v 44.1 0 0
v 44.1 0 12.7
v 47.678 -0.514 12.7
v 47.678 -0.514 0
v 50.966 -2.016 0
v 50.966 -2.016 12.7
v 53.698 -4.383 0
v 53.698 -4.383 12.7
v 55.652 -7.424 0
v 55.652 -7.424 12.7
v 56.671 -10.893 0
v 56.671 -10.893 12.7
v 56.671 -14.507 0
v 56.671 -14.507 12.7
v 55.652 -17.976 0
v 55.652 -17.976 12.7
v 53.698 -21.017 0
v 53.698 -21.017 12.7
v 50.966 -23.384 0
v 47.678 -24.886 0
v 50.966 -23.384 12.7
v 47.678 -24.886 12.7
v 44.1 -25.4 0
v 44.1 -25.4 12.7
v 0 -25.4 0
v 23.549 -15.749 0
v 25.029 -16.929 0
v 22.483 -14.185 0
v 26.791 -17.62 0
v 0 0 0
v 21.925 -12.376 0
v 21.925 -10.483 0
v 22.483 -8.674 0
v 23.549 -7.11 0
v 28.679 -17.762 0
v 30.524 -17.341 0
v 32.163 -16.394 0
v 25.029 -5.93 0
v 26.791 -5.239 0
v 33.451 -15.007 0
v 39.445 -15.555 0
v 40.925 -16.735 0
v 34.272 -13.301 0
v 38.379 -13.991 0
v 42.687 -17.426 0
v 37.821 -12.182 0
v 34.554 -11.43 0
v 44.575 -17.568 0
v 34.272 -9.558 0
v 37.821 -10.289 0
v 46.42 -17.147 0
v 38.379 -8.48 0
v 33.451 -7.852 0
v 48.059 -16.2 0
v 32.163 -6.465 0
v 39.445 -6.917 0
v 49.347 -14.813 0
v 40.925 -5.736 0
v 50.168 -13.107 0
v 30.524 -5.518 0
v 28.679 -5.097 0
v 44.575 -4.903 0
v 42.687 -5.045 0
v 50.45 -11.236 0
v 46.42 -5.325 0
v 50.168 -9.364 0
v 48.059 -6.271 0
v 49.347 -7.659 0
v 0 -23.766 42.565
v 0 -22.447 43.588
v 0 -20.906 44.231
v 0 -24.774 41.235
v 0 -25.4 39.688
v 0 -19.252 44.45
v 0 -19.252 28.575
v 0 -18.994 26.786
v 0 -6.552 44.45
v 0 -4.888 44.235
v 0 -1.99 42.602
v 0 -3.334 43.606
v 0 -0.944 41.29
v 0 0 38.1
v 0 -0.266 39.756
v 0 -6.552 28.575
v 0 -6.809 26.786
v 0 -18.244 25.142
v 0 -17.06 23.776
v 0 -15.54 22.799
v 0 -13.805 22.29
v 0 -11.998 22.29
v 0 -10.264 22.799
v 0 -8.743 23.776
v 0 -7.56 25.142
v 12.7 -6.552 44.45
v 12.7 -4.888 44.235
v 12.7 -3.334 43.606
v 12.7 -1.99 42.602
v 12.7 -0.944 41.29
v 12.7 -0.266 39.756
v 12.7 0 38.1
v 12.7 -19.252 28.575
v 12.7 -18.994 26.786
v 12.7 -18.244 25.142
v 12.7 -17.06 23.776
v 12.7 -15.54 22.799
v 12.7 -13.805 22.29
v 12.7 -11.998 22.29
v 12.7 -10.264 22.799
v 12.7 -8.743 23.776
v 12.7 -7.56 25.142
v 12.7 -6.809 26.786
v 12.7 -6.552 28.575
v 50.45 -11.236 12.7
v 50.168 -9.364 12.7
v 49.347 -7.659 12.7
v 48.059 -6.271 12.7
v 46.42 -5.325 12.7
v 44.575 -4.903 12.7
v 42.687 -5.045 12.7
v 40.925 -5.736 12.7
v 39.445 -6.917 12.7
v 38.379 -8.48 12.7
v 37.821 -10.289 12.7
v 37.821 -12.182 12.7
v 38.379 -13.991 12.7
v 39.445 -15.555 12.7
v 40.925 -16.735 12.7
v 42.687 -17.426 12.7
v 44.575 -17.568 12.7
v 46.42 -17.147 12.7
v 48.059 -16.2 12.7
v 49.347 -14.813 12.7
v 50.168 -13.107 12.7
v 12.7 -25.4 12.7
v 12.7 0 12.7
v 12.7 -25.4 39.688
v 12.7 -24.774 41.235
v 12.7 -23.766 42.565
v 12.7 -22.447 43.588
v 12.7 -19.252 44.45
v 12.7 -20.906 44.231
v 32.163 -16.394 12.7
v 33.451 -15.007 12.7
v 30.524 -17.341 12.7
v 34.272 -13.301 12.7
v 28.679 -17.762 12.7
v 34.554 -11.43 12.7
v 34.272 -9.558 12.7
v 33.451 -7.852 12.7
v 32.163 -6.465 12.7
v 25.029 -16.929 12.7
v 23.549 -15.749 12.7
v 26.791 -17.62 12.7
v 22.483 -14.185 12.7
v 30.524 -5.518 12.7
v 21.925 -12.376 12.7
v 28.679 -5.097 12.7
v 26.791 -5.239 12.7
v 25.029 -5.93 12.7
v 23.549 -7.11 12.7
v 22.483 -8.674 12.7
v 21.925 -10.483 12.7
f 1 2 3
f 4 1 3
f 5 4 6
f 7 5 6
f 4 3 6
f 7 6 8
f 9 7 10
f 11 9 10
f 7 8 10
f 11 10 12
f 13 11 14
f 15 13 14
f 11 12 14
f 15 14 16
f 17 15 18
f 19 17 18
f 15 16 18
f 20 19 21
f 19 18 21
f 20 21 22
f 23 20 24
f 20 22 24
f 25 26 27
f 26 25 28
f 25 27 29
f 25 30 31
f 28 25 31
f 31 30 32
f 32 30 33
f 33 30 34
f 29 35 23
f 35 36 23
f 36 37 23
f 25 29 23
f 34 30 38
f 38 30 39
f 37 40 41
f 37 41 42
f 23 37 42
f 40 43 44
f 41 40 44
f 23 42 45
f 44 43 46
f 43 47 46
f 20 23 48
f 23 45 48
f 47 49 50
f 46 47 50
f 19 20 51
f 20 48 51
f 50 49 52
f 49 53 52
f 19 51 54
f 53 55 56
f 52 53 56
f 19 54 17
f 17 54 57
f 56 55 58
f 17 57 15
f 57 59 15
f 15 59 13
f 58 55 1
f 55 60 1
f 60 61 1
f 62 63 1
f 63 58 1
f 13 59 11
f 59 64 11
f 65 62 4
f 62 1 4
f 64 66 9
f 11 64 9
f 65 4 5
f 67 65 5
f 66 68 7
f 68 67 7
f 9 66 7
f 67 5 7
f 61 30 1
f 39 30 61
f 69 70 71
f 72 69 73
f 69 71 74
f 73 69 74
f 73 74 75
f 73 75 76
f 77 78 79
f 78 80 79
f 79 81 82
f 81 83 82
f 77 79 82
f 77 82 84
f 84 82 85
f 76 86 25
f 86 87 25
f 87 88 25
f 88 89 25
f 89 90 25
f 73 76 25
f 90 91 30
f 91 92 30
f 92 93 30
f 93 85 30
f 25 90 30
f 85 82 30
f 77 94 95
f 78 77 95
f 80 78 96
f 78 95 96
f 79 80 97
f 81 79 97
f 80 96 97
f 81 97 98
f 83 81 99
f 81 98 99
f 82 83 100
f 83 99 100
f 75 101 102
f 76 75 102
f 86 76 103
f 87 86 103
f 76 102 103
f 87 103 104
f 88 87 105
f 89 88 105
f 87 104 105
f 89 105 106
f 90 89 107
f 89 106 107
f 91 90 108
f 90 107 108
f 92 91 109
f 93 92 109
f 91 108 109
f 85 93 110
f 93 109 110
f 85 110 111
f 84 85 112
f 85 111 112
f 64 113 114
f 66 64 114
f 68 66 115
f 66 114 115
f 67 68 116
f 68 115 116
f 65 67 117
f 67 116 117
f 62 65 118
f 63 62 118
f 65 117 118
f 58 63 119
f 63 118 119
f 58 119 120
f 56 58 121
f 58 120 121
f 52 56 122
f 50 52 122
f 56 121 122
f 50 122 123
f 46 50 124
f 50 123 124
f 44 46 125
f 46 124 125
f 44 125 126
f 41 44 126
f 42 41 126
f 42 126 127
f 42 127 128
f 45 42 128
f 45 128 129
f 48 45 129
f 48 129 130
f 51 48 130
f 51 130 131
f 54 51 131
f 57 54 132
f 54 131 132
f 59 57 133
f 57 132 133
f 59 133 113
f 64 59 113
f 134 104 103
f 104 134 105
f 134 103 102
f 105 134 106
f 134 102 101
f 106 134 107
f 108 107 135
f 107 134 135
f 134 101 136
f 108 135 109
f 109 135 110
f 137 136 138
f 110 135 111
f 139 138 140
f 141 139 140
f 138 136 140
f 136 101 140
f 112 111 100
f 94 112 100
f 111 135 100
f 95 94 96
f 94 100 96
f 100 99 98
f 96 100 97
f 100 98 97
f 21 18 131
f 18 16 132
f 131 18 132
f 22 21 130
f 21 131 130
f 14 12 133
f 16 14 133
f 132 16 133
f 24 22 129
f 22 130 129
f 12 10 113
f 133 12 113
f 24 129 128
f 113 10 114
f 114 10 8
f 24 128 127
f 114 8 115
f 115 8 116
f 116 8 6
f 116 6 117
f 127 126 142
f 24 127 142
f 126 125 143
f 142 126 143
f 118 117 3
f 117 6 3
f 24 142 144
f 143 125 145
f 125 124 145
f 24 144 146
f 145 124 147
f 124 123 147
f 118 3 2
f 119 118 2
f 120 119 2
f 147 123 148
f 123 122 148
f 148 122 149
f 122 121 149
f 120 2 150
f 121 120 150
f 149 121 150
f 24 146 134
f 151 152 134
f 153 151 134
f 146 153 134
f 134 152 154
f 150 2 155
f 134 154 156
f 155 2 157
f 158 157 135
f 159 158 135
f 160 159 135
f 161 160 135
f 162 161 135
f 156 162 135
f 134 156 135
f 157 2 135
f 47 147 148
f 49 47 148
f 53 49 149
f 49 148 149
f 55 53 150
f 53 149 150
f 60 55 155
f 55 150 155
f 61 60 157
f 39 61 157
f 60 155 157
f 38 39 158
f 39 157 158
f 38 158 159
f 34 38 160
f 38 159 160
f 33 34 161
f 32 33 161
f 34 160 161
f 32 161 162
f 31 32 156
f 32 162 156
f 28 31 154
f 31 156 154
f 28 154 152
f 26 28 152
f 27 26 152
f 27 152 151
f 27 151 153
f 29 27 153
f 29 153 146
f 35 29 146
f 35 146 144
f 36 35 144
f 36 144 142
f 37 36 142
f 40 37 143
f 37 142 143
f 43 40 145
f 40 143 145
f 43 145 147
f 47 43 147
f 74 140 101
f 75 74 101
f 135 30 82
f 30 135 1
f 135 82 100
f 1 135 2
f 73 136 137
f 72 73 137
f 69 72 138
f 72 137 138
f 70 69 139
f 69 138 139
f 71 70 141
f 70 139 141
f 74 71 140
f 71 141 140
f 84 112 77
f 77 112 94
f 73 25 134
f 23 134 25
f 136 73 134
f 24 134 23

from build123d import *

# Parameters (mm, degrees)
F1_DEPTH = 25.4
F3_DEPTH = 12.7
F4_R     = 6.35
F5_DEPTH = 12.7


with BuildPart() as f1:
    # F0 (on Front) → F1 (new body)
    with BuildSketch(Plane.XZ):
        Polygon((0, 44.45), (0, 0), (57.15, 0), (57.15, 12.7), (12.7, 12.7), (12.7, 44.45), align=None)
    extrude(amount=F1_DEPTH)

    # F2 (on face) → F3 (cut)
    with BuildSketch(Plane.YZ.offset(12.7)):
        with BuildLine():
            ThreePointArc((-19.2516389379, 28.575), (-12.9016389379, 22.225), (-6.5516389379, 28.575))
            ThreePointArc((-6.5516389379, 28.575), (-12.9016389379, 34.925), (-19.2516389379, 28.575))
        make_face()
        with BuildLine():
            ThreePointArc((-19.2516389379, 28.575), (-12.9016389379, 34.925), (-6.5516389379, 28.575))
            Line((-6.5516389379, 28.575), (-6.5516389379, 44.45))
            Line((-6.5516389379, 44.45), (-19.2516389379, 44.45))
            Line((-19.2516389379, 44.45), (-19.2516389379, 28.575))
        make_face()
        with BuildLine():
            Line((0, 44.45), (-6.5516389379, 44.45))
            ThreePointArc((-6.5516389379, 44.45), (-1.9896636866, 42.6019965832), (0, 38.1))
            Line((0, 38.1), (0, 44.45))
        make_face()
        with BuildLine():
            ThreePointArc((-25.4, 39.6875), (-23.1402039046, 43.1201157855), (-19.2516389379, 44.45))
            Line((-19.2516389379, 44.45), (-25.4, 44.45))
            Line((-25.4, 44.45), (-25.4, 39.6875))
        make_face()
    extrude(amount=-F3_DEPTH, mode=Mode.SUBTRACT)

    # F4 (on face) → F5 (cut)
    with BuildSketch(Plane.XY.offset(12.7)):
        with Locations((28.2040209995, -11.4295053813)):
            Circle(F4_R)
        with Locations((44.1000172256, -11.2356515601)):
            Circle(F4_R)
        with BuildLine():
            ThreePointArc((44.1000172256, 0), (56.8000172256, -12.7), (44.1000172256, -25.4))
            Line((44.1000172256, -25.4), (57.15, -25.4))
            Line((57.15, -25.4), (57.15, 0))
            Line((57.15, 0), (44.1000172256, 0))
        make_face()
    extrude(amount=-F5_DEPTH, mode=Mode.SUBTRACT)


solid = f1.part
